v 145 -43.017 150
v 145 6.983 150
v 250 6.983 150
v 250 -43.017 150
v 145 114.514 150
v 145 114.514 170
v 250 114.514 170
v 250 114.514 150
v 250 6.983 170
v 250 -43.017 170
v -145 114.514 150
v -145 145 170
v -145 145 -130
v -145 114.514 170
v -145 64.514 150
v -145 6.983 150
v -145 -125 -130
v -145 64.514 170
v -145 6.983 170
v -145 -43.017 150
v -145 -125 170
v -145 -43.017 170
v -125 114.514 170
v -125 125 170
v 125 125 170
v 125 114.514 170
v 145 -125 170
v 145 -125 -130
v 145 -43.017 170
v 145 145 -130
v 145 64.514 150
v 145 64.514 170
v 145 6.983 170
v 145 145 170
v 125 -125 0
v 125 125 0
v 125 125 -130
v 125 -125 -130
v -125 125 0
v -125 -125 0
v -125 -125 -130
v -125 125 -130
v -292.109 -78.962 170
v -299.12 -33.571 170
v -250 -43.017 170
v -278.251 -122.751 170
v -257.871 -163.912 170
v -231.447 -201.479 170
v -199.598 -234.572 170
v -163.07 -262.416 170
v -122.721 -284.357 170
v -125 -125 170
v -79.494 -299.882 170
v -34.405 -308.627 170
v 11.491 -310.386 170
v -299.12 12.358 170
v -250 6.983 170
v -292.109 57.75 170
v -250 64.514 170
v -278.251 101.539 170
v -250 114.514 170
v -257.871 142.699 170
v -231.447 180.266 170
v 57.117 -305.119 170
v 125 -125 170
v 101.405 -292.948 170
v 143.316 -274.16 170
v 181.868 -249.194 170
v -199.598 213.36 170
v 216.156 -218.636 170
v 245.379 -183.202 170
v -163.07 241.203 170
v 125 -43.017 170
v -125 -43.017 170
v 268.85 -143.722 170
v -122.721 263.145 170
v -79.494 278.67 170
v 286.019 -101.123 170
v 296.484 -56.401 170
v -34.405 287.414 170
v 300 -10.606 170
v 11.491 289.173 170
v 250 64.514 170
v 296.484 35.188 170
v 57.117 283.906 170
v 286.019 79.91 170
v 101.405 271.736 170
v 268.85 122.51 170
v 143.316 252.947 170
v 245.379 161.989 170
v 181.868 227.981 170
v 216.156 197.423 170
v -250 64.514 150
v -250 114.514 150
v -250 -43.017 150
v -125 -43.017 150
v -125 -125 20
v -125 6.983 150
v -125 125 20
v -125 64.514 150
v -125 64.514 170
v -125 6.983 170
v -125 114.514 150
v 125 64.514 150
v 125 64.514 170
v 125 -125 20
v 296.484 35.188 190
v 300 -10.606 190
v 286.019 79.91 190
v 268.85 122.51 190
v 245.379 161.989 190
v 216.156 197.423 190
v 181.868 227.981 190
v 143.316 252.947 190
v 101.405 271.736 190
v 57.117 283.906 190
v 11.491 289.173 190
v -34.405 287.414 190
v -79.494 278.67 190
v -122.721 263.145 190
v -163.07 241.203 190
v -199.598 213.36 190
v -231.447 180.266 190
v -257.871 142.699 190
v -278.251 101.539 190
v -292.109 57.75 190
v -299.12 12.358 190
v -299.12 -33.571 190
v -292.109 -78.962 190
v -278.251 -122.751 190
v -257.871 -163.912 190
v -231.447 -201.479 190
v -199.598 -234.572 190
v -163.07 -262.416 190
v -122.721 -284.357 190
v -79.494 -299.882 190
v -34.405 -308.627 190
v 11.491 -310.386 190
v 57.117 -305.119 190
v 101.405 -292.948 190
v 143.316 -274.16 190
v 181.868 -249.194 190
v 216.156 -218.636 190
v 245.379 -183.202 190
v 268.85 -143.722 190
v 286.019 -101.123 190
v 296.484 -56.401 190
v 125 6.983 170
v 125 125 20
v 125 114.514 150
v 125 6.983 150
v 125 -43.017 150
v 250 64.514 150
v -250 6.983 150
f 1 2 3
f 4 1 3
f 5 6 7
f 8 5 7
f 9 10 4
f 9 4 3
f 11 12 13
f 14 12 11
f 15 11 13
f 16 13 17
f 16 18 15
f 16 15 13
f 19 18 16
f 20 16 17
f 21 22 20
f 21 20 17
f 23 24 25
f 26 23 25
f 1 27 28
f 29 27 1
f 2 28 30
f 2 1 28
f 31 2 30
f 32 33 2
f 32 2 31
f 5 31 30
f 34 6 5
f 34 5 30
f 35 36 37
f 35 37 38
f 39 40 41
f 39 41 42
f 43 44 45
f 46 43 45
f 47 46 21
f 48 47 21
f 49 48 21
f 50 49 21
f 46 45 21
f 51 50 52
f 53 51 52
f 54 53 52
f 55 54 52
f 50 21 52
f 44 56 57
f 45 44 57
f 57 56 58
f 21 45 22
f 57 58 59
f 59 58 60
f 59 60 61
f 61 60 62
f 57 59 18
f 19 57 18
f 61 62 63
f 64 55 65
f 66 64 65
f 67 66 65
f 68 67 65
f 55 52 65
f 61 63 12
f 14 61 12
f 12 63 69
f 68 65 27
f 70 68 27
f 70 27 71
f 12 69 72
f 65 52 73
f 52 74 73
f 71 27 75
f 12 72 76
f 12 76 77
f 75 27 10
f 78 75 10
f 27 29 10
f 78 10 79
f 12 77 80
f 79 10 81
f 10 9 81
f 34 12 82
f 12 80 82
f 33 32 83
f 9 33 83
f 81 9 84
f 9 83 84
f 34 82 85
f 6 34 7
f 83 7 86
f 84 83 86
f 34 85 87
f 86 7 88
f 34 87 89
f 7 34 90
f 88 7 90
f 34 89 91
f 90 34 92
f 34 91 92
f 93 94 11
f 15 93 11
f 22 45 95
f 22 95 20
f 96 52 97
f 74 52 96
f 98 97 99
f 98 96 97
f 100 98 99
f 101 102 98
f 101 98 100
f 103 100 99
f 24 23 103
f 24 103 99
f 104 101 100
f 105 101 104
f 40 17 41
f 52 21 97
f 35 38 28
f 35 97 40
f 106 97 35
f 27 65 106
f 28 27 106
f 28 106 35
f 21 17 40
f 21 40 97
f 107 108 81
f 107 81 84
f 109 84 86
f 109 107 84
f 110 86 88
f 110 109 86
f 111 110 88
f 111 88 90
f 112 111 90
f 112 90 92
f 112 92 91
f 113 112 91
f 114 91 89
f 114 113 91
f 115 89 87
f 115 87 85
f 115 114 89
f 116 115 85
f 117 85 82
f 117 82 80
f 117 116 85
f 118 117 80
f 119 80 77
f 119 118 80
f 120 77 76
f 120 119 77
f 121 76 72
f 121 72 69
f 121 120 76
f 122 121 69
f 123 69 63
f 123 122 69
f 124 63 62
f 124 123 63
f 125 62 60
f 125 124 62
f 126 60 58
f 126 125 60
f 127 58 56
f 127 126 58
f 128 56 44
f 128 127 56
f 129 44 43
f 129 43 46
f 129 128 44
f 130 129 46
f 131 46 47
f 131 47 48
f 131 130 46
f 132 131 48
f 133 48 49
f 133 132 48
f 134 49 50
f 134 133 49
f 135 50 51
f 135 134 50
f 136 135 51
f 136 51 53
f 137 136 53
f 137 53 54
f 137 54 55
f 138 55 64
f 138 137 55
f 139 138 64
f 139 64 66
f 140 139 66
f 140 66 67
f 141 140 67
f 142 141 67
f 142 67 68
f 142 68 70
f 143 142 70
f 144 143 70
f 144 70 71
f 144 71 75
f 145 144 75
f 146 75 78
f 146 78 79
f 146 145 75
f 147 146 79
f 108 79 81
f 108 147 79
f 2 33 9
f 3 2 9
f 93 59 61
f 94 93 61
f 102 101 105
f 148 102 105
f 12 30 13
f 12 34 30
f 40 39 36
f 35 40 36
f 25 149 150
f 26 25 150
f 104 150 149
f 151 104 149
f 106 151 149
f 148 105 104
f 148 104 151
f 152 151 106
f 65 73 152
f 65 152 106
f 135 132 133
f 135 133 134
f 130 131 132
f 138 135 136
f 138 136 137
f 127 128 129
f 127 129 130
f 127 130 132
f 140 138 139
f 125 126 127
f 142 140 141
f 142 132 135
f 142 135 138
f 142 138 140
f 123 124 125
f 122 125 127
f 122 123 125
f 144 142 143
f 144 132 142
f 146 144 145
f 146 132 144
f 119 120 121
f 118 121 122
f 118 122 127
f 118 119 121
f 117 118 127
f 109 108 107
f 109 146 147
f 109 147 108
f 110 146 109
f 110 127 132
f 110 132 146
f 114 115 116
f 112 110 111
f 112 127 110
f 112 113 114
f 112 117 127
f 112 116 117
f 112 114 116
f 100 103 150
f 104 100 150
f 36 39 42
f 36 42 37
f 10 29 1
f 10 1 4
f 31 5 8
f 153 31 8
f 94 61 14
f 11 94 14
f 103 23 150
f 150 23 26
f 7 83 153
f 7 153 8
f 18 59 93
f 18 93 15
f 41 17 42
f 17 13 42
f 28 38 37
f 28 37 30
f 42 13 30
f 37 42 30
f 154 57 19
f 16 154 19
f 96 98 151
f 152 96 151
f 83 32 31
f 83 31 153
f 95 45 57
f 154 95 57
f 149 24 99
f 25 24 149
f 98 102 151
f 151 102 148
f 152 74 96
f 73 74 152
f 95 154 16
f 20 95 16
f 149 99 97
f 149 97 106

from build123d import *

# Parameters (mm, degrees)
F0_W     = 250
F0_H     = 250
F1_DEPTH = 20
F2_W     = 10
F2_H     = 20
F2_W_2   = 250
F2_W_3   = 9.5461905003
F3_DEPTH = 150
F4_W     = 105
F4_H     = 50
F4_W_2   = 250
F5_DEPTH = 20
F7_R     = 300
F8_DEPTH = 20


with BuildPart() as f1:
    # F0 (on Top) → F1 (new body)
    with BuildSketch(Plane.XY):
        Rectangle(F0_W, F0_H)
    extrude(amount=F1_DEPTH)

    # F2 (on face) → F3 (join, symmetric)
    with BuildSketch(Plane.XY.offset(20)):
        Polygon((-145, -125), (-125, -125), (-125, 125), (-135, 125), (-135, 145), (-145, 145), align=None)
        with Locations((-130, 135)):
            Rectangle(F2_W, F2_H)
        with Locations((0, 135)):
            Rectangle(F2_W_2, F2_H)
        with Locations((129.7730952501, 135)):
            Rectangle(F2_W_3, F2_H)
        Polygon((125, 125), (125, -125), (145, -125), (145, 145), (134.5461905003, 145), (134.5461905003, 125), align=None)
    extrude(amount=F3_DEPTH, both=True)

    # F4 (on face) → F5 (join)
    with BuildSketch(Plane.XY.offset(170)):
        with Locations((-197.5, 89.5141008463)):
            Rectangle(F4_W, F4_H)
        with Locations((-197.5, -18.0167201906)):
            Rectangle(F4_W, F4_H)
        with Locations((0, -18.0167201906)):
            Rectangle(F4_W_2, F4_H)
        with Locations((0, 89.5141008463)):
            Rectangle(F4_W_2, F4_H)
        with Locations((197.5, 89.5141008463)):
            Rectangle(F4_W, F4_H)
        with Locations((197.5, -18.0167201906)):
            Rectangle(F4_W, F4_H)
    extrude(amount=-F5_DEPTH)

    # F7 (on offset) → F8 (join)
    with BuildSketch(Plane.XY.offset(190)):
        with Locations((0, -10.6063758958)):
            Circle(F7_R)
    extrude(amount=-F8_DEPTH)


solid = f1.part
